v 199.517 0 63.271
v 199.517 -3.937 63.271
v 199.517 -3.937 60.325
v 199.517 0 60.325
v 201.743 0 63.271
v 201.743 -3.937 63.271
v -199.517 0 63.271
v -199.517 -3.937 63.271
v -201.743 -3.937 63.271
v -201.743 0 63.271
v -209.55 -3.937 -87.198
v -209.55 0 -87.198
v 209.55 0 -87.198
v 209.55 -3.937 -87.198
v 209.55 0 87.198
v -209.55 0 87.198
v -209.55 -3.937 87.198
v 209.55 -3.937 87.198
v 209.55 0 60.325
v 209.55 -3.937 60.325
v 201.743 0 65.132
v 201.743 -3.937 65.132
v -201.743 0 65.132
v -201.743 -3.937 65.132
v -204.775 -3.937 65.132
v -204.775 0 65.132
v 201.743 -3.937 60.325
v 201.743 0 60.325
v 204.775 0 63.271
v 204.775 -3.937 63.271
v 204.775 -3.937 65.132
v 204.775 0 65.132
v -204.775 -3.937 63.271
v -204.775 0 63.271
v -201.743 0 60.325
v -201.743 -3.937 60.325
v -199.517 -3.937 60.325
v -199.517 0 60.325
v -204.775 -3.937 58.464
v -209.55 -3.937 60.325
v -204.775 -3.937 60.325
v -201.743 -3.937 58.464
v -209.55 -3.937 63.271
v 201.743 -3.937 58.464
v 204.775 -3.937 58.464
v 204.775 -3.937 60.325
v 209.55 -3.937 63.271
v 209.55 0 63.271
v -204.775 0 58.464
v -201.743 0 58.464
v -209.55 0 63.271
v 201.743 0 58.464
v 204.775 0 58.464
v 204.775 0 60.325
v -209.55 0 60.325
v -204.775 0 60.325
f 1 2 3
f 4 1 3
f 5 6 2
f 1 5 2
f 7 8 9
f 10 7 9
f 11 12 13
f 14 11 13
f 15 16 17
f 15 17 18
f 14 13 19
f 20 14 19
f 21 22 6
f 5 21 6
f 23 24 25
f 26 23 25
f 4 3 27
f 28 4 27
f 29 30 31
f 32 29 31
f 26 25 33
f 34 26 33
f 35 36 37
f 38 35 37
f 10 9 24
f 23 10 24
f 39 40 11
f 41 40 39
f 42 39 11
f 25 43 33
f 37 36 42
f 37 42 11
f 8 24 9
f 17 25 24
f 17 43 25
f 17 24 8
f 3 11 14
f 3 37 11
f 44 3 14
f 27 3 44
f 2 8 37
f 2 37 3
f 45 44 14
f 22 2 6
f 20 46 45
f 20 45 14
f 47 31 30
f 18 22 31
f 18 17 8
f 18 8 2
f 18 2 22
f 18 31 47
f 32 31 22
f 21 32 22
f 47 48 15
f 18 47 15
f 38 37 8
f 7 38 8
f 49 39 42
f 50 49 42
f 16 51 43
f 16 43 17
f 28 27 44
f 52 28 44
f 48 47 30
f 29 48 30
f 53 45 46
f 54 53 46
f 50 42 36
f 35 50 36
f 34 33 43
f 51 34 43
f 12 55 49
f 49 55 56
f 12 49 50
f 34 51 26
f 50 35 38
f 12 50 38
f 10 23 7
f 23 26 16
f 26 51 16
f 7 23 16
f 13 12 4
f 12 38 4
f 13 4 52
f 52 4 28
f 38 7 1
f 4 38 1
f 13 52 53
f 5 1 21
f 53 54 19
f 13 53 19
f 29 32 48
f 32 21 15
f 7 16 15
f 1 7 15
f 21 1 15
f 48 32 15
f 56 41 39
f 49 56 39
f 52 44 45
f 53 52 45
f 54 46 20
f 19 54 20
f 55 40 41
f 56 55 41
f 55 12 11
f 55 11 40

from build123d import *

# Parameters (mm, degrees)
F0_W     = 419.1
F0_H     = 174.3964
F1_DEPTH = 3.937
F2_W     = 3.175
F2_H     = 2.9464
F3_DEPTH = 3.937


with BuildPart() as f1:
    # F0 (on Front) → F1 (new body)
    with BuildSketch(Plane.XZ):
        Rectangle(F0_W, F0_H)
    extrude(amount=F1_DEPTH)

    # F2 (on face) → F3 (cut, through all)
    with BuildSketch(Plane.XZ.offset(3.937)):
        Polygon((-206.375, 63.2714), (-206.375, 60.325), (-204.7748, 60.325), (-204.7748, 58.46445), (-201.742675, 58.46445), (-201.742675, 60.325), (-199.517, 60.325), (-199.517, 61.7982), (-199.517, 63.2714), (-201.742675, 63.2714), (-201.742675, 65.13195), (-204.7748, 65.13195), (-204.7748, 63.2714), align=None)
        with Locations((-207.9625, 61.7982)):
            Rectangle(F2_W, F2_H)
        Polygon((201.742675, 58.46445), (204.7748, 58.46445), (204.7748, 60.325), (206.375, 60.325), (206.375, 63.2714), (204.7748, 63.2714), (204.7748, 65.13195), (201.742675, 65.13195), (201.742675, 63.2714), (199.517, 63.2714), (199.517, 61.7982), (199.517, 60.325), (201.742675, 60.325), align=None)
        with Locations((207.9625, 61.7982)):
            Rectangle(F2_W, F2_H)
    extrude(amount=-F3_DEPTH, mode=Mode.SUBTRACT)


solid = f1.part
